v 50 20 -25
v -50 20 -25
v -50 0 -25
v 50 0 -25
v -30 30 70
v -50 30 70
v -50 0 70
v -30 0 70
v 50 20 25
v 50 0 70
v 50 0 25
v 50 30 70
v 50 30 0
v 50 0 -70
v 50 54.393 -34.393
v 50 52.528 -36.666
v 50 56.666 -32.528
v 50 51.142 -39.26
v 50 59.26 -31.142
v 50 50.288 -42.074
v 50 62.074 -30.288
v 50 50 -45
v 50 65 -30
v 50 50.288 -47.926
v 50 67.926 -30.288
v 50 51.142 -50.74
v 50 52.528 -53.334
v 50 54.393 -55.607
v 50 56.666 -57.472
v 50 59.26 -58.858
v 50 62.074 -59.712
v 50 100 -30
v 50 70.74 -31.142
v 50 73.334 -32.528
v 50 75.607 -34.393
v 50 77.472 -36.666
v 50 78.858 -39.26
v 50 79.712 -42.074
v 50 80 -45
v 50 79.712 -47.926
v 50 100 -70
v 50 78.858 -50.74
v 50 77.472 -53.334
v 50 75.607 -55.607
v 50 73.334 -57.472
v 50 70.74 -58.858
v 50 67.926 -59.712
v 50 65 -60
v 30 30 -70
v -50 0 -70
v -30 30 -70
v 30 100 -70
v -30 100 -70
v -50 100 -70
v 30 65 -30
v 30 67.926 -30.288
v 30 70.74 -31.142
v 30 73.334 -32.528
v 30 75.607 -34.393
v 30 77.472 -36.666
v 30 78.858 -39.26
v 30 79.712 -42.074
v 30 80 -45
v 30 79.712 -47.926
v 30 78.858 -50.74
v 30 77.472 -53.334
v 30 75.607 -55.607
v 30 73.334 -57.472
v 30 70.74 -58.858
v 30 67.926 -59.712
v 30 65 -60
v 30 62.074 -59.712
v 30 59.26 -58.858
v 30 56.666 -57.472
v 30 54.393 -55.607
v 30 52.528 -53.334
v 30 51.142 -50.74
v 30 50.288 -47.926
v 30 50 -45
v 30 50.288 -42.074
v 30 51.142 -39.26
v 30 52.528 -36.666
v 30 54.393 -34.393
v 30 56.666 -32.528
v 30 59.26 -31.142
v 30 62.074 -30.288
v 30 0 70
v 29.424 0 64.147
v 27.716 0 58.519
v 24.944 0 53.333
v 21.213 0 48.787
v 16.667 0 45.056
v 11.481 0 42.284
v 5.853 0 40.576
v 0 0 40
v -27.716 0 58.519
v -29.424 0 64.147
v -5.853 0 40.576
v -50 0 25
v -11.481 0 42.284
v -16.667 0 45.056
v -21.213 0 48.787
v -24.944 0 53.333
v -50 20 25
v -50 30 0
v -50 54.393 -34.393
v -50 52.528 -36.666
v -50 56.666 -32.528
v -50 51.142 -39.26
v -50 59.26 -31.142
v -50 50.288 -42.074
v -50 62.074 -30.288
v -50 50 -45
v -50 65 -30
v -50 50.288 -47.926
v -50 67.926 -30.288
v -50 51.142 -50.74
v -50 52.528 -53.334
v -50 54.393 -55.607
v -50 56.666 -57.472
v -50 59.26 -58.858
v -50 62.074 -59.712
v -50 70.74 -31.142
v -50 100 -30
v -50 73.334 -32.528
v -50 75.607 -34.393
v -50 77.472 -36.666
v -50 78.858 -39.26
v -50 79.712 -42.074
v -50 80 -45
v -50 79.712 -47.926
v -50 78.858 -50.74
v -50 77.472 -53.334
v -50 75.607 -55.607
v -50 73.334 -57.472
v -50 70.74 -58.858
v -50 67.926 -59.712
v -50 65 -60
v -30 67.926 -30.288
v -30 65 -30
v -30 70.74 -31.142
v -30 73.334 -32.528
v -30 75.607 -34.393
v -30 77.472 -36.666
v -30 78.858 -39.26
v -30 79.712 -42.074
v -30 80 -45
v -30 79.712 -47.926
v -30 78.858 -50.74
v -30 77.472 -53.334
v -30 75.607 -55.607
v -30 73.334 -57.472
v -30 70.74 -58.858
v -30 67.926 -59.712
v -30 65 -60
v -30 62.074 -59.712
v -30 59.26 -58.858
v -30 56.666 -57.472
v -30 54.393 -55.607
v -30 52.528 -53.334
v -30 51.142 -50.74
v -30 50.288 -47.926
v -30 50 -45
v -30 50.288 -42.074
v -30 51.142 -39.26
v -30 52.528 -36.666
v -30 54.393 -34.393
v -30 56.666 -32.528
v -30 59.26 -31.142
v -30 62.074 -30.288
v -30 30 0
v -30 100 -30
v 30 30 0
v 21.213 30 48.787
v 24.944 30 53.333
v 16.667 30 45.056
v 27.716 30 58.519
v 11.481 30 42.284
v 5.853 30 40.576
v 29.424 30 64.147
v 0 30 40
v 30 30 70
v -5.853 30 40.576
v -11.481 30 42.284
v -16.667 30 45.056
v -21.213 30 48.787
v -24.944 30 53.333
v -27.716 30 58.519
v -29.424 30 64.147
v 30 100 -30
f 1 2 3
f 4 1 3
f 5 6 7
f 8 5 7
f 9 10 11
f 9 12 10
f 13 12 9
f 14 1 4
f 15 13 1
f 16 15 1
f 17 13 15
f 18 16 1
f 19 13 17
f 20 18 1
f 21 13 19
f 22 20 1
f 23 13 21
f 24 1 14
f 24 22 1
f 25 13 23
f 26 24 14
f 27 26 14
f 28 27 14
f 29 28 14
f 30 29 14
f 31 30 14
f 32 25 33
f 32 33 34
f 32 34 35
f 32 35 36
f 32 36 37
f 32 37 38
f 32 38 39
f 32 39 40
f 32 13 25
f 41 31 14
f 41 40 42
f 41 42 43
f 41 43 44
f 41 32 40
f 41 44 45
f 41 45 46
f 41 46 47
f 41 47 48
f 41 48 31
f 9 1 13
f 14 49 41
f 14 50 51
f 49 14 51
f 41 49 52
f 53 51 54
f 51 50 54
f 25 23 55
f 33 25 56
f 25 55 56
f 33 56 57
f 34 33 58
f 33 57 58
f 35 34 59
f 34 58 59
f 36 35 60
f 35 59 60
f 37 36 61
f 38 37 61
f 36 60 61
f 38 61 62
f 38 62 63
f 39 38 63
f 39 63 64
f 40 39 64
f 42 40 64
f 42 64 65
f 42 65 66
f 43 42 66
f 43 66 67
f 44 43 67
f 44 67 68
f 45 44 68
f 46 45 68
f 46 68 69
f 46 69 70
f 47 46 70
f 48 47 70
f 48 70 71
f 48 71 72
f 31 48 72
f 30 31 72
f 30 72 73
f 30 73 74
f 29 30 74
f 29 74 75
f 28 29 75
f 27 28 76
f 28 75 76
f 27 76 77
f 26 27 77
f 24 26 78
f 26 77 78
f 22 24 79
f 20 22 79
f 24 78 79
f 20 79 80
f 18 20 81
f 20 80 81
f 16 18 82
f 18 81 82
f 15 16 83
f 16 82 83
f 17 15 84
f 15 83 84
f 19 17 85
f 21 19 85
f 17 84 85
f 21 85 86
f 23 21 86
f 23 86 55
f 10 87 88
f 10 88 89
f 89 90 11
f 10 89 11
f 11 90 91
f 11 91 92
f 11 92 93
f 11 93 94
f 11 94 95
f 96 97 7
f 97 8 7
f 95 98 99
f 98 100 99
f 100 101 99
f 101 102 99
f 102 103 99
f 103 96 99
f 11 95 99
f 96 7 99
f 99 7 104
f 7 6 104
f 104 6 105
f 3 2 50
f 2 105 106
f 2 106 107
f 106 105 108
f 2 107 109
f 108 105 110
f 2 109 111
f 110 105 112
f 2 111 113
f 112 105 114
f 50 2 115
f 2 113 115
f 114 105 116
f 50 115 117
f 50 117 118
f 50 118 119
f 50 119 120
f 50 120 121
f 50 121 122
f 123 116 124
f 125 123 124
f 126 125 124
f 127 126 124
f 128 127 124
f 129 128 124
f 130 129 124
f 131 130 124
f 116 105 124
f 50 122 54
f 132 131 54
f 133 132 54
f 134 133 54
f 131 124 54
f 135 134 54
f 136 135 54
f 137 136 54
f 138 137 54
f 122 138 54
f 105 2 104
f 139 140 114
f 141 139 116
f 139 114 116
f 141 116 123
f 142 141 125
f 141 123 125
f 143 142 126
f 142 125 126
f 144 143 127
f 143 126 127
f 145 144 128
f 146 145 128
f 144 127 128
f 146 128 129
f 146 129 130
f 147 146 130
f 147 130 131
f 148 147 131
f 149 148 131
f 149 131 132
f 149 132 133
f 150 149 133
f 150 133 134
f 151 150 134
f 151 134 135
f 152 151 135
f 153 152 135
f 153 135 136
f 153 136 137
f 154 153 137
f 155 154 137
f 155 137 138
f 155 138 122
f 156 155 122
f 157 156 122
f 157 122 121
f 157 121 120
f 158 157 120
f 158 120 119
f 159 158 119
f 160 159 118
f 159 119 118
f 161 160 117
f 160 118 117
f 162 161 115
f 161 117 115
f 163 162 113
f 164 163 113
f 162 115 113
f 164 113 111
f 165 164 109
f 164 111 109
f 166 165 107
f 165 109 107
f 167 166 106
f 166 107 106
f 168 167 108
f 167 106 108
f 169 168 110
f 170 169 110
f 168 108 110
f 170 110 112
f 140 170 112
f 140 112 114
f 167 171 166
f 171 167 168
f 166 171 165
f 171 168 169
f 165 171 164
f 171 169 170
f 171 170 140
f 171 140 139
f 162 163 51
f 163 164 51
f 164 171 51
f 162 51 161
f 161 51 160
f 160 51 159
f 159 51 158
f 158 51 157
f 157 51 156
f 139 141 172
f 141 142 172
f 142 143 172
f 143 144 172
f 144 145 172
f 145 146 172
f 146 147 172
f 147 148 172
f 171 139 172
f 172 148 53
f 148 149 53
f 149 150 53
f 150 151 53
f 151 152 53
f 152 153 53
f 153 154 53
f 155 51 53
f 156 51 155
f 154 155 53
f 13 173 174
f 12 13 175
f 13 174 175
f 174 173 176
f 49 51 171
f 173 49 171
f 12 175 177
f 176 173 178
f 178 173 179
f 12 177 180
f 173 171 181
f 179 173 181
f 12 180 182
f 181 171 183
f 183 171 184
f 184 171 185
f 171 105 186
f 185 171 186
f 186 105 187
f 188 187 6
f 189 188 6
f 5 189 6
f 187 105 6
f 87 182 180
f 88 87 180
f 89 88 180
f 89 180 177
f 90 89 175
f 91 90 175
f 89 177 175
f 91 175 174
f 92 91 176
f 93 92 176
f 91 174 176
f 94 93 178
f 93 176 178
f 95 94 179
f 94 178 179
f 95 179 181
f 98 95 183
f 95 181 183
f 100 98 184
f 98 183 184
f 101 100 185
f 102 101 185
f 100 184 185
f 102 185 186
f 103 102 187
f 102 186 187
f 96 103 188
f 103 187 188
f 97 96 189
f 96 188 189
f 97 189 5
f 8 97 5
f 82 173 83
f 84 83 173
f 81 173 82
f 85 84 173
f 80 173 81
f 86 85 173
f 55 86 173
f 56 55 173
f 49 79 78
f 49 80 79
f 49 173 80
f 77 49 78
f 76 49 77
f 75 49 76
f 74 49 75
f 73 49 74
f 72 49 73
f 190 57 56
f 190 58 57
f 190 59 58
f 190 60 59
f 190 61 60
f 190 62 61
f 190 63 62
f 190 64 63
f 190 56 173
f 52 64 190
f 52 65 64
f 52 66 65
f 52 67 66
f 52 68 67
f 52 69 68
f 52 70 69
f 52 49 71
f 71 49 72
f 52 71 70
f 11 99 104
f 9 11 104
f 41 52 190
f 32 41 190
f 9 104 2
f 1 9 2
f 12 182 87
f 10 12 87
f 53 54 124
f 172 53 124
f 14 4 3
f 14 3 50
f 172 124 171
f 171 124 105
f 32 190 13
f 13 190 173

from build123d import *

# Parameters (mm, degrees)
BOSS_EXTRUDE1_DEPTH      = 50
BOSS_EXTRUDE1_DEPTH_BACK = 50
CUT_EXTRUDE2_DEPTH       = 111.905365064
HOLE1_D                  = 30
SKETCH5_W                = 60
SKETCH5_H                = 70
CUT_EXTRUDE3_DEPTH       = 180.164728672


with BuildPart() as part:
    # Sketch1 → Boss-Extrude1 (new, two sides: drawn at the far end of the back side and taken through both)
    with BuildSketch(Plane(origin=(0, 0, 0), x_dir=(0, 0, -1), z_dir=(1, 0, 0)).offset(-BOSS_EXTRUDE1_DEPTH_BACK)):
        Polygon((-70, 0), (-25, 0), (-25, 20), (25, 20), (25, 0), (70, 0), (70, 100), (30, 100), (0, 30), (-70, 30), align=None)
    extrude(amount=BOSS_EXTRUDE1_DEPTH + BOSS_EXTRUDE1_DEPTH_BACK)

    # Sketch2 → Cut-Extrude2 (cut, through all)
    with BuildSketch(Plane(origin=(0, 30, 0), x_dir=(1, 0, 0), z_dir=(0, 1, 0))):
        with BuildLine():
            Line((-30, -70), (30, -70))
            ThreePointArc((30, -70), (0, -40), (-30, -70))
        make_face()
    extrude(amount=-CUT_EXTRUDE2_DEPTH, mode=Mode.SUBTRACT)

    # Hole1 (through all)
    with Locations(Plane(origin=(50, 0, 0), x_dir=(0, 0, -1), z_dir=(1, 0, 0))):
        with Locations((45, 65)):
            Hole(HOLE1_D / 2)

    # Sketch5 → Cut-Extrude3 (cut, through all)
    with BuildSketch(Plane(origin=(0, 0, -70), x_dir=(-1, 0, 0), z_dir=(0, 0, -1))):
        with Locations((0, 65)):
            Rectangle(SKETCH5_W, SKETCH5_H)
    extrude(amount=-CUT_EXTRUDE3_DEPTH, mode=Mode.SUBTRACT)


solid = part.part
